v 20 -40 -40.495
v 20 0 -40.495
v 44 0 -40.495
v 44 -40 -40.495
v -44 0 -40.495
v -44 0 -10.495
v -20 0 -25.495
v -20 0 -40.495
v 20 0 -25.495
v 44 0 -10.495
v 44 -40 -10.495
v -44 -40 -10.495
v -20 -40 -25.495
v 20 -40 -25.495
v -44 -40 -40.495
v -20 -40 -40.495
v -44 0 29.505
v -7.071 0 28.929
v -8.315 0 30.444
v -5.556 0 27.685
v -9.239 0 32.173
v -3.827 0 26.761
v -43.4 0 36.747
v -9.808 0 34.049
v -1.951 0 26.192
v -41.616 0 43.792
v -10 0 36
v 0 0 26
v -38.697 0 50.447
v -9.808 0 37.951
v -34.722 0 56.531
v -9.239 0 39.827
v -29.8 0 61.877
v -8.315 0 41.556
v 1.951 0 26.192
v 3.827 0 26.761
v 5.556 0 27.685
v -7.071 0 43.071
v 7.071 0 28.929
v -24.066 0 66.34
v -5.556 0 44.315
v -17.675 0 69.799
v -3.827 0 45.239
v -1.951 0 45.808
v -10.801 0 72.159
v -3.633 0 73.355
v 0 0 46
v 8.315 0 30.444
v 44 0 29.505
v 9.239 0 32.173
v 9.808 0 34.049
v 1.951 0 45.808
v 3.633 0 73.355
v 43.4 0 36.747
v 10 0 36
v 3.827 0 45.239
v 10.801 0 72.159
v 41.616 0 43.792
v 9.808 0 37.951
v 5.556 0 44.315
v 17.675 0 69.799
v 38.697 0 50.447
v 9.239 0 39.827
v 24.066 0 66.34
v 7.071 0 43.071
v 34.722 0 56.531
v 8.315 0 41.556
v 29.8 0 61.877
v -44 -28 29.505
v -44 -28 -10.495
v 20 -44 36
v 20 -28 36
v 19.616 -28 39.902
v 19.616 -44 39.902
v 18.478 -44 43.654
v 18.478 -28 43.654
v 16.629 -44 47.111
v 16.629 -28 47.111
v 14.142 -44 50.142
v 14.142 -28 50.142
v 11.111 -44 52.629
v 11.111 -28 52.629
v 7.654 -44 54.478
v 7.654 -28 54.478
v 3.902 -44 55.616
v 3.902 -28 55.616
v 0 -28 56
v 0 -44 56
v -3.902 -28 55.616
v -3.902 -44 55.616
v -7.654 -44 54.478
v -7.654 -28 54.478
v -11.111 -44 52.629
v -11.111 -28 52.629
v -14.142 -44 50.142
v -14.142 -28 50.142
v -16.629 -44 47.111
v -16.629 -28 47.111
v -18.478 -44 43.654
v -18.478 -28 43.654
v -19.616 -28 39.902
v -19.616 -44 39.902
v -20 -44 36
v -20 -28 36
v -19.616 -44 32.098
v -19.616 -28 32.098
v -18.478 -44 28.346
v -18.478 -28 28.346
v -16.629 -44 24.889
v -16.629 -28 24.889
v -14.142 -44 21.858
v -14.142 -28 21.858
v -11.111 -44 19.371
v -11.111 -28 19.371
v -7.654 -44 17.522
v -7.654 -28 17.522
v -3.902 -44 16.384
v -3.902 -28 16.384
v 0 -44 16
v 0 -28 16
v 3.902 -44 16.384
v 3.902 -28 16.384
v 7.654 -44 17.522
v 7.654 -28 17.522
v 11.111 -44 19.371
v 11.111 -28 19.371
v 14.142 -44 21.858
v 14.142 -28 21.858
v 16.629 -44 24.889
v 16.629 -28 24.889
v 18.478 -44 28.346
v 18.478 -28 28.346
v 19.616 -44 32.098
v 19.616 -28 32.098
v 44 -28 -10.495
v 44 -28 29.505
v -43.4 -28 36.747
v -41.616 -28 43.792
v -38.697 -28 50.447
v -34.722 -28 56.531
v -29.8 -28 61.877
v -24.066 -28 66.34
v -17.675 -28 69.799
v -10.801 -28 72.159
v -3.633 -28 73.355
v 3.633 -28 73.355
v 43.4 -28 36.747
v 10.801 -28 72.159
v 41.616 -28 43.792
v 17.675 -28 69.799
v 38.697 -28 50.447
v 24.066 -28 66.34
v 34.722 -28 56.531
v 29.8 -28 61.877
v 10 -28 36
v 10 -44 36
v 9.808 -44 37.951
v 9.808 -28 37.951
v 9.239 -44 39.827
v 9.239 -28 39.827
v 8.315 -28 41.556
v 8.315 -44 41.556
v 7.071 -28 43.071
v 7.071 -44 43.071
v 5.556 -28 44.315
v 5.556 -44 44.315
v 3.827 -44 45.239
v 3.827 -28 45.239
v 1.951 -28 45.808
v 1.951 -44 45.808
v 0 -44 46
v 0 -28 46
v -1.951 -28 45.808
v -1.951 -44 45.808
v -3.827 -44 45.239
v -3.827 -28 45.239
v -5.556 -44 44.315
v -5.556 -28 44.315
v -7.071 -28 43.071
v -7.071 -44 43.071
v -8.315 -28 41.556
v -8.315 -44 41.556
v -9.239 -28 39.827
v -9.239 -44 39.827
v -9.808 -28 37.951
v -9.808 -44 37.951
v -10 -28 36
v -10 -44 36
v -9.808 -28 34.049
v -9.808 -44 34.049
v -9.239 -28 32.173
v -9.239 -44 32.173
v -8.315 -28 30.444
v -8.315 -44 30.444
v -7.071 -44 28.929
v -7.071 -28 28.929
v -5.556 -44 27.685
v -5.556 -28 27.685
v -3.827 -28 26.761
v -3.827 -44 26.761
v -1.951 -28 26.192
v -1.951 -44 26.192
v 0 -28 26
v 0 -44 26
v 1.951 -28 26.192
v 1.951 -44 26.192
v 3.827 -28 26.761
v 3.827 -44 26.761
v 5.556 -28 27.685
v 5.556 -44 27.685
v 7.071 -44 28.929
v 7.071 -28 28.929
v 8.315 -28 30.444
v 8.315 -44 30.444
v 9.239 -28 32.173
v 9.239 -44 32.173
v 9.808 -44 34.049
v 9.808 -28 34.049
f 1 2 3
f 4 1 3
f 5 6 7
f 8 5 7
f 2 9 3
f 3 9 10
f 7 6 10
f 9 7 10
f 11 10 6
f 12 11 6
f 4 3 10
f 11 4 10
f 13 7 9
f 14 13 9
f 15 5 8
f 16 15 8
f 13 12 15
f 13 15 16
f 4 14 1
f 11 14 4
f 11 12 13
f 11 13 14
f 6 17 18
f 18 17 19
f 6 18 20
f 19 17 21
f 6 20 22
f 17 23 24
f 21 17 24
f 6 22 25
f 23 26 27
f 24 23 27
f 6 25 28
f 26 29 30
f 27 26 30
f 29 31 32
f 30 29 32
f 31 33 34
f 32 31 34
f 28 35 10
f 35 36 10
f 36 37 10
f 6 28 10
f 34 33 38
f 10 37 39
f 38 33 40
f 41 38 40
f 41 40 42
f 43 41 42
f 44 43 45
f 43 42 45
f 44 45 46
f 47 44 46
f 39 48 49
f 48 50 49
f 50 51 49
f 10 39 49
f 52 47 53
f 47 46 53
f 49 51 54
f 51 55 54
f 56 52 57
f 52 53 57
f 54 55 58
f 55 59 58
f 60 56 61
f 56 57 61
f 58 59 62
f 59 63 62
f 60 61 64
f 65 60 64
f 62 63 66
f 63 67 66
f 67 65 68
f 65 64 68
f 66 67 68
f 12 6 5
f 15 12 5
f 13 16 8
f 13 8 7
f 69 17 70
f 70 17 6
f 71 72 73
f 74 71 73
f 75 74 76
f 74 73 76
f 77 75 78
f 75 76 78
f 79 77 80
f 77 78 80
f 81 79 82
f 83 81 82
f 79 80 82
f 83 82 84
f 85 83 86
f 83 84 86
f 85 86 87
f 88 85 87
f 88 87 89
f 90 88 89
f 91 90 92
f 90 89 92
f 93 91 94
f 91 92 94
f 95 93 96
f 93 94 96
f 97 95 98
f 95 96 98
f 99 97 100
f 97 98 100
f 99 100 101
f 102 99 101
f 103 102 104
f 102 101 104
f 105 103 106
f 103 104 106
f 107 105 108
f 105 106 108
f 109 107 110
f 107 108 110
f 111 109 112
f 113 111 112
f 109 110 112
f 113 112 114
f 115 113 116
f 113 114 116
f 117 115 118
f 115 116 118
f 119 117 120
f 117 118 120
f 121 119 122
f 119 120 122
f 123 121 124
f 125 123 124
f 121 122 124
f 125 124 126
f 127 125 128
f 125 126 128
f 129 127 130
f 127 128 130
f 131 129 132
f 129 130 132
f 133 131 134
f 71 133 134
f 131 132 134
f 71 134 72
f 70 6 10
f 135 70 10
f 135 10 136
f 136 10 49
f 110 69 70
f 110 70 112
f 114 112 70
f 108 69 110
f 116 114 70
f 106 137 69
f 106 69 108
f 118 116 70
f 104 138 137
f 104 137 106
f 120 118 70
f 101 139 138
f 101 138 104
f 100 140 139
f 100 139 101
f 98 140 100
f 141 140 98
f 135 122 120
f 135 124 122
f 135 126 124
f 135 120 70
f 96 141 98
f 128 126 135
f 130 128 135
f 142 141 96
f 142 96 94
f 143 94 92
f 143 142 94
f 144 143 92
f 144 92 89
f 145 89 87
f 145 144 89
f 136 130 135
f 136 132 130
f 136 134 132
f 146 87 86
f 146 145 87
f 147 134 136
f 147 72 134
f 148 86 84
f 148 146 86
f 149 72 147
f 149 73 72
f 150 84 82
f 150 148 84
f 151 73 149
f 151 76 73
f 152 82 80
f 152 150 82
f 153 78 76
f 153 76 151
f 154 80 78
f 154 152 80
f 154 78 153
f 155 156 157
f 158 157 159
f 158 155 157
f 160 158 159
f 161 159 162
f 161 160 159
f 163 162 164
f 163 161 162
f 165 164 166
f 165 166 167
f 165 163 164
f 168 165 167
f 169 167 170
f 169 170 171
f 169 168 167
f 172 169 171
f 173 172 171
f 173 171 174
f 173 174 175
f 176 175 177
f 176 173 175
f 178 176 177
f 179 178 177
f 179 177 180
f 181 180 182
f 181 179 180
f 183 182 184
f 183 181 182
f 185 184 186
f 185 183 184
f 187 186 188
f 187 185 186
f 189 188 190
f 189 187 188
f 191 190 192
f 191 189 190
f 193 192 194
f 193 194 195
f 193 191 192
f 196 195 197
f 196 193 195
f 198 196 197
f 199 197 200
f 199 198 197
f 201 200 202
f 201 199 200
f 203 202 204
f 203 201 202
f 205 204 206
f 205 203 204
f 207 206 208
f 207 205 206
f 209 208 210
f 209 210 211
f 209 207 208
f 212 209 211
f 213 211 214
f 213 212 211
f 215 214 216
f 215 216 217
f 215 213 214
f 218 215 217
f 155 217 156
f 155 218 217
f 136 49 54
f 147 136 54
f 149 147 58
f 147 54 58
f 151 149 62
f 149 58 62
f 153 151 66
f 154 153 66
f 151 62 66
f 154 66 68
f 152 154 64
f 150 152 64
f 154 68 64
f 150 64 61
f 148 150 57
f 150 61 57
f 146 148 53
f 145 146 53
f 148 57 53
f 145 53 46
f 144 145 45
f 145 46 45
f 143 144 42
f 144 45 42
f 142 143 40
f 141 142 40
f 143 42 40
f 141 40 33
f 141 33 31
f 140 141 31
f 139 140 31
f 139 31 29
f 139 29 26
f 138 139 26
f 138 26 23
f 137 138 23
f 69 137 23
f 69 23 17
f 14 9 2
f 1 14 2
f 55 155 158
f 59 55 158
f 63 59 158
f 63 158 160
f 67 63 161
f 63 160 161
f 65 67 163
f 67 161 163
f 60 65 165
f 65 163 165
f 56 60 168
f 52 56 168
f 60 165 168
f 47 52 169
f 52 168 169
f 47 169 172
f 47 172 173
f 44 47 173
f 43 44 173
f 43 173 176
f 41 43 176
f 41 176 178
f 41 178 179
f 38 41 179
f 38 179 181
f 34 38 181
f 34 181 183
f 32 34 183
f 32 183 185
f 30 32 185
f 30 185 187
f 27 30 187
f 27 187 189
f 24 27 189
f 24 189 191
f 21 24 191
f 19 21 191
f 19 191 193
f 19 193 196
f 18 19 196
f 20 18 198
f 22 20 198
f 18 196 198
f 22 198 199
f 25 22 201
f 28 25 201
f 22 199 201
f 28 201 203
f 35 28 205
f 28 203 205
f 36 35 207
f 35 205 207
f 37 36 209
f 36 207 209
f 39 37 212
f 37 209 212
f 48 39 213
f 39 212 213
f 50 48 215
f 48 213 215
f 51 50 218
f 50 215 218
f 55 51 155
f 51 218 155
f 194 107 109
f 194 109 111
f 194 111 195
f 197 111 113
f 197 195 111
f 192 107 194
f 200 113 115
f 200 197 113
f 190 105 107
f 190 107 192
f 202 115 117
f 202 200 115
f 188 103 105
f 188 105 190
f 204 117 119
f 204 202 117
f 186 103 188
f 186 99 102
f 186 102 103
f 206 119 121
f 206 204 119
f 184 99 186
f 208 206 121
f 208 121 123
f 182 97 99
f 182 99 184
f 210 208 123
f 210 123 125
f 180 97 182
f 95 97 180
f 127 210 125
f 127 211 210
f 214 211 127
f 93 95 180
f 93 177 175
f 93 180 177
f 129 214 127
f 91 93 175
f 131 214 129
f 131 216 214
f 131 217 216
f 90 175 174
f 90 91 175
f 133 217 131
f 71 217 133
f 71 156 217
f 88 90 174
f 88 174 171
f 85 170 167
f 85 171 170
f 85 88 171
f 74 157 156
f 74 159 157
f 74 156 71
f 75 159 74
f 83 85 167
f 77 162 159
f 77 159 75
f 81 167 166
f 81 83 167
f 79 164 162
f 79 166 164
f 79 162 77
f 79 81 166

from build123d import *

# Parameters (mm, degrees)
F1_DEPTH  = 40
F3_DEPTH  = 28
F4_R      = 20
F4_R_2    = 10
F5_DEPTH  = 16
F5_FACE_R = 10
F6_DEPTH  = 100


with BuildPart() as f1:
    # F0 (on Front) → F1 (new body)
    with BuildSketch(Plane.XZ):
        Polygon((44, -10.494859), (-44, -10.494859), (-44, -40.494859), (-20, -40.494859), (-20, -25.494859), (20, -25.494859), (20, -40.494859), (44, -40.494859), align=None)
    extrude(amount=F1_DEPTH)


with BuildPart() as f3:
    # F2 (on Front) → F3 (new body)
    with BuildSketch(Plane.XZ):
        with BuildLine():
            Line((-44, -10.494859), (44, -10.494859))
            Line((44, -10.494859), (44, 29.505141))
            ThreePointArc((44, 29.505141), (0, 73.505141), (-44, 29.505141))
            Line((-44, 29.505141), (-44, -10.494859))
        make_face()
    extrude(amount=F3_DEPTH)

    # F4 (on face) → F5 (join)
    with BuildSketch(Plane.XZ.offset(28)):
        with Locations((0, 36)):
            Circle(F4_R)
        with Locations((0, 36)):
            Circle(F4_R_2, mode=Mode.SUBTRACT)
    extrude(amount=F5_DEPTH)

    # F5_face (on face) → F6 (cut)
    with BuildSketch(Plane(origin=(0, -28, 36), x_dir=(1, 0, 0), z_dir=(0, -1, 0))):
        Circle(F5_FACE_R)
    extrude(amount=-F6_DEPTH, mode=Mode.SUBTRACT)


solid = Compound([f1.part, f3.part])
